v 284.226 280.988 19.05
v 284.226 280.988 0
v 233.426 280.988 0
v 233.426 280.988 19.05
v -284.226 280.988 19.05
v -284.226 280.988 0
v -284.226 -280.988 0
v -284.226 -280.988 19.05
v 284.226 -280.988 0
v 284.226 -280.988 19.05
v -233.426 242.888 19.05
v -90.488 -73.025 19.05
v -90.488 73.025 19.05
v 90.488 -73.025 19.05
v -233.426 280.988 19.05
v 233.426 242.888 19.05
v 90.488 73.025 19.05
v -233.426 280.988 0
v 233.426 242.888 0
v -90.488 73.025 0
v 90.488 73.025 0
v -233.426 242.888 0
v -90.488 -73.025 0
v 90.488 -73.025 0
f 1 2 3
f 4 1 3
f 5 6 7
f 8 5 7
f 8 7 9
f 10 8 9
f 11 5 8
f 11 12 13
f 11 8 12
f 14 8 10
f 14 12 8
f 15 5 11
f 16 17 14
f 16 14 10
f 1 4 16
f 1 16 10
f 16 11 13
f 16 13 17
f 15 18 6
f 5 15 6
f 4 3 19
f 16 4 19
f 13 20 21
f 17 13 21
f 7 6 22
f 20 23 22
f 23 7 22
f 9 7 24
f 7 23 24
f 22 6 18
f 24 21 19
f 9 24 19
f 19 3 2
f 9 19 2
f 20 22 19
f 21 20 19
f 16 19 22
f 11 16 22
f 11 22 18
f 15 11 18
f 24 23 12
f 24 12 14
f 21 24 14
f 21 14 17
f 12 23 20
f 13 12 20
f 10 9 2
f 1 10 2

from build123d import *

# Parameters (mm, degrees)
F0_W     = 180.975
F0_H     = 146.05
F1_DEPTH = 19.05


with BuildPart() as f1:
    # F0 (on Top) → F1 (new body)
    with BuildSketch(Plane.XY):
        Polygon((284.226, -280.9875), (284.226, 280.9875), (233.426, 280.9875), (233.426, 242.8875), (-233.426, 242.8875), (-233.426, 280.9875), (-284.226, 280.9875), (-284.226, -280.9875), align=None)
        Rectangle(F0_W, F0_H, mode=Mode.SUBTRACT)
    extrude(amount=F1_DEPTH)


solid = f1.part
